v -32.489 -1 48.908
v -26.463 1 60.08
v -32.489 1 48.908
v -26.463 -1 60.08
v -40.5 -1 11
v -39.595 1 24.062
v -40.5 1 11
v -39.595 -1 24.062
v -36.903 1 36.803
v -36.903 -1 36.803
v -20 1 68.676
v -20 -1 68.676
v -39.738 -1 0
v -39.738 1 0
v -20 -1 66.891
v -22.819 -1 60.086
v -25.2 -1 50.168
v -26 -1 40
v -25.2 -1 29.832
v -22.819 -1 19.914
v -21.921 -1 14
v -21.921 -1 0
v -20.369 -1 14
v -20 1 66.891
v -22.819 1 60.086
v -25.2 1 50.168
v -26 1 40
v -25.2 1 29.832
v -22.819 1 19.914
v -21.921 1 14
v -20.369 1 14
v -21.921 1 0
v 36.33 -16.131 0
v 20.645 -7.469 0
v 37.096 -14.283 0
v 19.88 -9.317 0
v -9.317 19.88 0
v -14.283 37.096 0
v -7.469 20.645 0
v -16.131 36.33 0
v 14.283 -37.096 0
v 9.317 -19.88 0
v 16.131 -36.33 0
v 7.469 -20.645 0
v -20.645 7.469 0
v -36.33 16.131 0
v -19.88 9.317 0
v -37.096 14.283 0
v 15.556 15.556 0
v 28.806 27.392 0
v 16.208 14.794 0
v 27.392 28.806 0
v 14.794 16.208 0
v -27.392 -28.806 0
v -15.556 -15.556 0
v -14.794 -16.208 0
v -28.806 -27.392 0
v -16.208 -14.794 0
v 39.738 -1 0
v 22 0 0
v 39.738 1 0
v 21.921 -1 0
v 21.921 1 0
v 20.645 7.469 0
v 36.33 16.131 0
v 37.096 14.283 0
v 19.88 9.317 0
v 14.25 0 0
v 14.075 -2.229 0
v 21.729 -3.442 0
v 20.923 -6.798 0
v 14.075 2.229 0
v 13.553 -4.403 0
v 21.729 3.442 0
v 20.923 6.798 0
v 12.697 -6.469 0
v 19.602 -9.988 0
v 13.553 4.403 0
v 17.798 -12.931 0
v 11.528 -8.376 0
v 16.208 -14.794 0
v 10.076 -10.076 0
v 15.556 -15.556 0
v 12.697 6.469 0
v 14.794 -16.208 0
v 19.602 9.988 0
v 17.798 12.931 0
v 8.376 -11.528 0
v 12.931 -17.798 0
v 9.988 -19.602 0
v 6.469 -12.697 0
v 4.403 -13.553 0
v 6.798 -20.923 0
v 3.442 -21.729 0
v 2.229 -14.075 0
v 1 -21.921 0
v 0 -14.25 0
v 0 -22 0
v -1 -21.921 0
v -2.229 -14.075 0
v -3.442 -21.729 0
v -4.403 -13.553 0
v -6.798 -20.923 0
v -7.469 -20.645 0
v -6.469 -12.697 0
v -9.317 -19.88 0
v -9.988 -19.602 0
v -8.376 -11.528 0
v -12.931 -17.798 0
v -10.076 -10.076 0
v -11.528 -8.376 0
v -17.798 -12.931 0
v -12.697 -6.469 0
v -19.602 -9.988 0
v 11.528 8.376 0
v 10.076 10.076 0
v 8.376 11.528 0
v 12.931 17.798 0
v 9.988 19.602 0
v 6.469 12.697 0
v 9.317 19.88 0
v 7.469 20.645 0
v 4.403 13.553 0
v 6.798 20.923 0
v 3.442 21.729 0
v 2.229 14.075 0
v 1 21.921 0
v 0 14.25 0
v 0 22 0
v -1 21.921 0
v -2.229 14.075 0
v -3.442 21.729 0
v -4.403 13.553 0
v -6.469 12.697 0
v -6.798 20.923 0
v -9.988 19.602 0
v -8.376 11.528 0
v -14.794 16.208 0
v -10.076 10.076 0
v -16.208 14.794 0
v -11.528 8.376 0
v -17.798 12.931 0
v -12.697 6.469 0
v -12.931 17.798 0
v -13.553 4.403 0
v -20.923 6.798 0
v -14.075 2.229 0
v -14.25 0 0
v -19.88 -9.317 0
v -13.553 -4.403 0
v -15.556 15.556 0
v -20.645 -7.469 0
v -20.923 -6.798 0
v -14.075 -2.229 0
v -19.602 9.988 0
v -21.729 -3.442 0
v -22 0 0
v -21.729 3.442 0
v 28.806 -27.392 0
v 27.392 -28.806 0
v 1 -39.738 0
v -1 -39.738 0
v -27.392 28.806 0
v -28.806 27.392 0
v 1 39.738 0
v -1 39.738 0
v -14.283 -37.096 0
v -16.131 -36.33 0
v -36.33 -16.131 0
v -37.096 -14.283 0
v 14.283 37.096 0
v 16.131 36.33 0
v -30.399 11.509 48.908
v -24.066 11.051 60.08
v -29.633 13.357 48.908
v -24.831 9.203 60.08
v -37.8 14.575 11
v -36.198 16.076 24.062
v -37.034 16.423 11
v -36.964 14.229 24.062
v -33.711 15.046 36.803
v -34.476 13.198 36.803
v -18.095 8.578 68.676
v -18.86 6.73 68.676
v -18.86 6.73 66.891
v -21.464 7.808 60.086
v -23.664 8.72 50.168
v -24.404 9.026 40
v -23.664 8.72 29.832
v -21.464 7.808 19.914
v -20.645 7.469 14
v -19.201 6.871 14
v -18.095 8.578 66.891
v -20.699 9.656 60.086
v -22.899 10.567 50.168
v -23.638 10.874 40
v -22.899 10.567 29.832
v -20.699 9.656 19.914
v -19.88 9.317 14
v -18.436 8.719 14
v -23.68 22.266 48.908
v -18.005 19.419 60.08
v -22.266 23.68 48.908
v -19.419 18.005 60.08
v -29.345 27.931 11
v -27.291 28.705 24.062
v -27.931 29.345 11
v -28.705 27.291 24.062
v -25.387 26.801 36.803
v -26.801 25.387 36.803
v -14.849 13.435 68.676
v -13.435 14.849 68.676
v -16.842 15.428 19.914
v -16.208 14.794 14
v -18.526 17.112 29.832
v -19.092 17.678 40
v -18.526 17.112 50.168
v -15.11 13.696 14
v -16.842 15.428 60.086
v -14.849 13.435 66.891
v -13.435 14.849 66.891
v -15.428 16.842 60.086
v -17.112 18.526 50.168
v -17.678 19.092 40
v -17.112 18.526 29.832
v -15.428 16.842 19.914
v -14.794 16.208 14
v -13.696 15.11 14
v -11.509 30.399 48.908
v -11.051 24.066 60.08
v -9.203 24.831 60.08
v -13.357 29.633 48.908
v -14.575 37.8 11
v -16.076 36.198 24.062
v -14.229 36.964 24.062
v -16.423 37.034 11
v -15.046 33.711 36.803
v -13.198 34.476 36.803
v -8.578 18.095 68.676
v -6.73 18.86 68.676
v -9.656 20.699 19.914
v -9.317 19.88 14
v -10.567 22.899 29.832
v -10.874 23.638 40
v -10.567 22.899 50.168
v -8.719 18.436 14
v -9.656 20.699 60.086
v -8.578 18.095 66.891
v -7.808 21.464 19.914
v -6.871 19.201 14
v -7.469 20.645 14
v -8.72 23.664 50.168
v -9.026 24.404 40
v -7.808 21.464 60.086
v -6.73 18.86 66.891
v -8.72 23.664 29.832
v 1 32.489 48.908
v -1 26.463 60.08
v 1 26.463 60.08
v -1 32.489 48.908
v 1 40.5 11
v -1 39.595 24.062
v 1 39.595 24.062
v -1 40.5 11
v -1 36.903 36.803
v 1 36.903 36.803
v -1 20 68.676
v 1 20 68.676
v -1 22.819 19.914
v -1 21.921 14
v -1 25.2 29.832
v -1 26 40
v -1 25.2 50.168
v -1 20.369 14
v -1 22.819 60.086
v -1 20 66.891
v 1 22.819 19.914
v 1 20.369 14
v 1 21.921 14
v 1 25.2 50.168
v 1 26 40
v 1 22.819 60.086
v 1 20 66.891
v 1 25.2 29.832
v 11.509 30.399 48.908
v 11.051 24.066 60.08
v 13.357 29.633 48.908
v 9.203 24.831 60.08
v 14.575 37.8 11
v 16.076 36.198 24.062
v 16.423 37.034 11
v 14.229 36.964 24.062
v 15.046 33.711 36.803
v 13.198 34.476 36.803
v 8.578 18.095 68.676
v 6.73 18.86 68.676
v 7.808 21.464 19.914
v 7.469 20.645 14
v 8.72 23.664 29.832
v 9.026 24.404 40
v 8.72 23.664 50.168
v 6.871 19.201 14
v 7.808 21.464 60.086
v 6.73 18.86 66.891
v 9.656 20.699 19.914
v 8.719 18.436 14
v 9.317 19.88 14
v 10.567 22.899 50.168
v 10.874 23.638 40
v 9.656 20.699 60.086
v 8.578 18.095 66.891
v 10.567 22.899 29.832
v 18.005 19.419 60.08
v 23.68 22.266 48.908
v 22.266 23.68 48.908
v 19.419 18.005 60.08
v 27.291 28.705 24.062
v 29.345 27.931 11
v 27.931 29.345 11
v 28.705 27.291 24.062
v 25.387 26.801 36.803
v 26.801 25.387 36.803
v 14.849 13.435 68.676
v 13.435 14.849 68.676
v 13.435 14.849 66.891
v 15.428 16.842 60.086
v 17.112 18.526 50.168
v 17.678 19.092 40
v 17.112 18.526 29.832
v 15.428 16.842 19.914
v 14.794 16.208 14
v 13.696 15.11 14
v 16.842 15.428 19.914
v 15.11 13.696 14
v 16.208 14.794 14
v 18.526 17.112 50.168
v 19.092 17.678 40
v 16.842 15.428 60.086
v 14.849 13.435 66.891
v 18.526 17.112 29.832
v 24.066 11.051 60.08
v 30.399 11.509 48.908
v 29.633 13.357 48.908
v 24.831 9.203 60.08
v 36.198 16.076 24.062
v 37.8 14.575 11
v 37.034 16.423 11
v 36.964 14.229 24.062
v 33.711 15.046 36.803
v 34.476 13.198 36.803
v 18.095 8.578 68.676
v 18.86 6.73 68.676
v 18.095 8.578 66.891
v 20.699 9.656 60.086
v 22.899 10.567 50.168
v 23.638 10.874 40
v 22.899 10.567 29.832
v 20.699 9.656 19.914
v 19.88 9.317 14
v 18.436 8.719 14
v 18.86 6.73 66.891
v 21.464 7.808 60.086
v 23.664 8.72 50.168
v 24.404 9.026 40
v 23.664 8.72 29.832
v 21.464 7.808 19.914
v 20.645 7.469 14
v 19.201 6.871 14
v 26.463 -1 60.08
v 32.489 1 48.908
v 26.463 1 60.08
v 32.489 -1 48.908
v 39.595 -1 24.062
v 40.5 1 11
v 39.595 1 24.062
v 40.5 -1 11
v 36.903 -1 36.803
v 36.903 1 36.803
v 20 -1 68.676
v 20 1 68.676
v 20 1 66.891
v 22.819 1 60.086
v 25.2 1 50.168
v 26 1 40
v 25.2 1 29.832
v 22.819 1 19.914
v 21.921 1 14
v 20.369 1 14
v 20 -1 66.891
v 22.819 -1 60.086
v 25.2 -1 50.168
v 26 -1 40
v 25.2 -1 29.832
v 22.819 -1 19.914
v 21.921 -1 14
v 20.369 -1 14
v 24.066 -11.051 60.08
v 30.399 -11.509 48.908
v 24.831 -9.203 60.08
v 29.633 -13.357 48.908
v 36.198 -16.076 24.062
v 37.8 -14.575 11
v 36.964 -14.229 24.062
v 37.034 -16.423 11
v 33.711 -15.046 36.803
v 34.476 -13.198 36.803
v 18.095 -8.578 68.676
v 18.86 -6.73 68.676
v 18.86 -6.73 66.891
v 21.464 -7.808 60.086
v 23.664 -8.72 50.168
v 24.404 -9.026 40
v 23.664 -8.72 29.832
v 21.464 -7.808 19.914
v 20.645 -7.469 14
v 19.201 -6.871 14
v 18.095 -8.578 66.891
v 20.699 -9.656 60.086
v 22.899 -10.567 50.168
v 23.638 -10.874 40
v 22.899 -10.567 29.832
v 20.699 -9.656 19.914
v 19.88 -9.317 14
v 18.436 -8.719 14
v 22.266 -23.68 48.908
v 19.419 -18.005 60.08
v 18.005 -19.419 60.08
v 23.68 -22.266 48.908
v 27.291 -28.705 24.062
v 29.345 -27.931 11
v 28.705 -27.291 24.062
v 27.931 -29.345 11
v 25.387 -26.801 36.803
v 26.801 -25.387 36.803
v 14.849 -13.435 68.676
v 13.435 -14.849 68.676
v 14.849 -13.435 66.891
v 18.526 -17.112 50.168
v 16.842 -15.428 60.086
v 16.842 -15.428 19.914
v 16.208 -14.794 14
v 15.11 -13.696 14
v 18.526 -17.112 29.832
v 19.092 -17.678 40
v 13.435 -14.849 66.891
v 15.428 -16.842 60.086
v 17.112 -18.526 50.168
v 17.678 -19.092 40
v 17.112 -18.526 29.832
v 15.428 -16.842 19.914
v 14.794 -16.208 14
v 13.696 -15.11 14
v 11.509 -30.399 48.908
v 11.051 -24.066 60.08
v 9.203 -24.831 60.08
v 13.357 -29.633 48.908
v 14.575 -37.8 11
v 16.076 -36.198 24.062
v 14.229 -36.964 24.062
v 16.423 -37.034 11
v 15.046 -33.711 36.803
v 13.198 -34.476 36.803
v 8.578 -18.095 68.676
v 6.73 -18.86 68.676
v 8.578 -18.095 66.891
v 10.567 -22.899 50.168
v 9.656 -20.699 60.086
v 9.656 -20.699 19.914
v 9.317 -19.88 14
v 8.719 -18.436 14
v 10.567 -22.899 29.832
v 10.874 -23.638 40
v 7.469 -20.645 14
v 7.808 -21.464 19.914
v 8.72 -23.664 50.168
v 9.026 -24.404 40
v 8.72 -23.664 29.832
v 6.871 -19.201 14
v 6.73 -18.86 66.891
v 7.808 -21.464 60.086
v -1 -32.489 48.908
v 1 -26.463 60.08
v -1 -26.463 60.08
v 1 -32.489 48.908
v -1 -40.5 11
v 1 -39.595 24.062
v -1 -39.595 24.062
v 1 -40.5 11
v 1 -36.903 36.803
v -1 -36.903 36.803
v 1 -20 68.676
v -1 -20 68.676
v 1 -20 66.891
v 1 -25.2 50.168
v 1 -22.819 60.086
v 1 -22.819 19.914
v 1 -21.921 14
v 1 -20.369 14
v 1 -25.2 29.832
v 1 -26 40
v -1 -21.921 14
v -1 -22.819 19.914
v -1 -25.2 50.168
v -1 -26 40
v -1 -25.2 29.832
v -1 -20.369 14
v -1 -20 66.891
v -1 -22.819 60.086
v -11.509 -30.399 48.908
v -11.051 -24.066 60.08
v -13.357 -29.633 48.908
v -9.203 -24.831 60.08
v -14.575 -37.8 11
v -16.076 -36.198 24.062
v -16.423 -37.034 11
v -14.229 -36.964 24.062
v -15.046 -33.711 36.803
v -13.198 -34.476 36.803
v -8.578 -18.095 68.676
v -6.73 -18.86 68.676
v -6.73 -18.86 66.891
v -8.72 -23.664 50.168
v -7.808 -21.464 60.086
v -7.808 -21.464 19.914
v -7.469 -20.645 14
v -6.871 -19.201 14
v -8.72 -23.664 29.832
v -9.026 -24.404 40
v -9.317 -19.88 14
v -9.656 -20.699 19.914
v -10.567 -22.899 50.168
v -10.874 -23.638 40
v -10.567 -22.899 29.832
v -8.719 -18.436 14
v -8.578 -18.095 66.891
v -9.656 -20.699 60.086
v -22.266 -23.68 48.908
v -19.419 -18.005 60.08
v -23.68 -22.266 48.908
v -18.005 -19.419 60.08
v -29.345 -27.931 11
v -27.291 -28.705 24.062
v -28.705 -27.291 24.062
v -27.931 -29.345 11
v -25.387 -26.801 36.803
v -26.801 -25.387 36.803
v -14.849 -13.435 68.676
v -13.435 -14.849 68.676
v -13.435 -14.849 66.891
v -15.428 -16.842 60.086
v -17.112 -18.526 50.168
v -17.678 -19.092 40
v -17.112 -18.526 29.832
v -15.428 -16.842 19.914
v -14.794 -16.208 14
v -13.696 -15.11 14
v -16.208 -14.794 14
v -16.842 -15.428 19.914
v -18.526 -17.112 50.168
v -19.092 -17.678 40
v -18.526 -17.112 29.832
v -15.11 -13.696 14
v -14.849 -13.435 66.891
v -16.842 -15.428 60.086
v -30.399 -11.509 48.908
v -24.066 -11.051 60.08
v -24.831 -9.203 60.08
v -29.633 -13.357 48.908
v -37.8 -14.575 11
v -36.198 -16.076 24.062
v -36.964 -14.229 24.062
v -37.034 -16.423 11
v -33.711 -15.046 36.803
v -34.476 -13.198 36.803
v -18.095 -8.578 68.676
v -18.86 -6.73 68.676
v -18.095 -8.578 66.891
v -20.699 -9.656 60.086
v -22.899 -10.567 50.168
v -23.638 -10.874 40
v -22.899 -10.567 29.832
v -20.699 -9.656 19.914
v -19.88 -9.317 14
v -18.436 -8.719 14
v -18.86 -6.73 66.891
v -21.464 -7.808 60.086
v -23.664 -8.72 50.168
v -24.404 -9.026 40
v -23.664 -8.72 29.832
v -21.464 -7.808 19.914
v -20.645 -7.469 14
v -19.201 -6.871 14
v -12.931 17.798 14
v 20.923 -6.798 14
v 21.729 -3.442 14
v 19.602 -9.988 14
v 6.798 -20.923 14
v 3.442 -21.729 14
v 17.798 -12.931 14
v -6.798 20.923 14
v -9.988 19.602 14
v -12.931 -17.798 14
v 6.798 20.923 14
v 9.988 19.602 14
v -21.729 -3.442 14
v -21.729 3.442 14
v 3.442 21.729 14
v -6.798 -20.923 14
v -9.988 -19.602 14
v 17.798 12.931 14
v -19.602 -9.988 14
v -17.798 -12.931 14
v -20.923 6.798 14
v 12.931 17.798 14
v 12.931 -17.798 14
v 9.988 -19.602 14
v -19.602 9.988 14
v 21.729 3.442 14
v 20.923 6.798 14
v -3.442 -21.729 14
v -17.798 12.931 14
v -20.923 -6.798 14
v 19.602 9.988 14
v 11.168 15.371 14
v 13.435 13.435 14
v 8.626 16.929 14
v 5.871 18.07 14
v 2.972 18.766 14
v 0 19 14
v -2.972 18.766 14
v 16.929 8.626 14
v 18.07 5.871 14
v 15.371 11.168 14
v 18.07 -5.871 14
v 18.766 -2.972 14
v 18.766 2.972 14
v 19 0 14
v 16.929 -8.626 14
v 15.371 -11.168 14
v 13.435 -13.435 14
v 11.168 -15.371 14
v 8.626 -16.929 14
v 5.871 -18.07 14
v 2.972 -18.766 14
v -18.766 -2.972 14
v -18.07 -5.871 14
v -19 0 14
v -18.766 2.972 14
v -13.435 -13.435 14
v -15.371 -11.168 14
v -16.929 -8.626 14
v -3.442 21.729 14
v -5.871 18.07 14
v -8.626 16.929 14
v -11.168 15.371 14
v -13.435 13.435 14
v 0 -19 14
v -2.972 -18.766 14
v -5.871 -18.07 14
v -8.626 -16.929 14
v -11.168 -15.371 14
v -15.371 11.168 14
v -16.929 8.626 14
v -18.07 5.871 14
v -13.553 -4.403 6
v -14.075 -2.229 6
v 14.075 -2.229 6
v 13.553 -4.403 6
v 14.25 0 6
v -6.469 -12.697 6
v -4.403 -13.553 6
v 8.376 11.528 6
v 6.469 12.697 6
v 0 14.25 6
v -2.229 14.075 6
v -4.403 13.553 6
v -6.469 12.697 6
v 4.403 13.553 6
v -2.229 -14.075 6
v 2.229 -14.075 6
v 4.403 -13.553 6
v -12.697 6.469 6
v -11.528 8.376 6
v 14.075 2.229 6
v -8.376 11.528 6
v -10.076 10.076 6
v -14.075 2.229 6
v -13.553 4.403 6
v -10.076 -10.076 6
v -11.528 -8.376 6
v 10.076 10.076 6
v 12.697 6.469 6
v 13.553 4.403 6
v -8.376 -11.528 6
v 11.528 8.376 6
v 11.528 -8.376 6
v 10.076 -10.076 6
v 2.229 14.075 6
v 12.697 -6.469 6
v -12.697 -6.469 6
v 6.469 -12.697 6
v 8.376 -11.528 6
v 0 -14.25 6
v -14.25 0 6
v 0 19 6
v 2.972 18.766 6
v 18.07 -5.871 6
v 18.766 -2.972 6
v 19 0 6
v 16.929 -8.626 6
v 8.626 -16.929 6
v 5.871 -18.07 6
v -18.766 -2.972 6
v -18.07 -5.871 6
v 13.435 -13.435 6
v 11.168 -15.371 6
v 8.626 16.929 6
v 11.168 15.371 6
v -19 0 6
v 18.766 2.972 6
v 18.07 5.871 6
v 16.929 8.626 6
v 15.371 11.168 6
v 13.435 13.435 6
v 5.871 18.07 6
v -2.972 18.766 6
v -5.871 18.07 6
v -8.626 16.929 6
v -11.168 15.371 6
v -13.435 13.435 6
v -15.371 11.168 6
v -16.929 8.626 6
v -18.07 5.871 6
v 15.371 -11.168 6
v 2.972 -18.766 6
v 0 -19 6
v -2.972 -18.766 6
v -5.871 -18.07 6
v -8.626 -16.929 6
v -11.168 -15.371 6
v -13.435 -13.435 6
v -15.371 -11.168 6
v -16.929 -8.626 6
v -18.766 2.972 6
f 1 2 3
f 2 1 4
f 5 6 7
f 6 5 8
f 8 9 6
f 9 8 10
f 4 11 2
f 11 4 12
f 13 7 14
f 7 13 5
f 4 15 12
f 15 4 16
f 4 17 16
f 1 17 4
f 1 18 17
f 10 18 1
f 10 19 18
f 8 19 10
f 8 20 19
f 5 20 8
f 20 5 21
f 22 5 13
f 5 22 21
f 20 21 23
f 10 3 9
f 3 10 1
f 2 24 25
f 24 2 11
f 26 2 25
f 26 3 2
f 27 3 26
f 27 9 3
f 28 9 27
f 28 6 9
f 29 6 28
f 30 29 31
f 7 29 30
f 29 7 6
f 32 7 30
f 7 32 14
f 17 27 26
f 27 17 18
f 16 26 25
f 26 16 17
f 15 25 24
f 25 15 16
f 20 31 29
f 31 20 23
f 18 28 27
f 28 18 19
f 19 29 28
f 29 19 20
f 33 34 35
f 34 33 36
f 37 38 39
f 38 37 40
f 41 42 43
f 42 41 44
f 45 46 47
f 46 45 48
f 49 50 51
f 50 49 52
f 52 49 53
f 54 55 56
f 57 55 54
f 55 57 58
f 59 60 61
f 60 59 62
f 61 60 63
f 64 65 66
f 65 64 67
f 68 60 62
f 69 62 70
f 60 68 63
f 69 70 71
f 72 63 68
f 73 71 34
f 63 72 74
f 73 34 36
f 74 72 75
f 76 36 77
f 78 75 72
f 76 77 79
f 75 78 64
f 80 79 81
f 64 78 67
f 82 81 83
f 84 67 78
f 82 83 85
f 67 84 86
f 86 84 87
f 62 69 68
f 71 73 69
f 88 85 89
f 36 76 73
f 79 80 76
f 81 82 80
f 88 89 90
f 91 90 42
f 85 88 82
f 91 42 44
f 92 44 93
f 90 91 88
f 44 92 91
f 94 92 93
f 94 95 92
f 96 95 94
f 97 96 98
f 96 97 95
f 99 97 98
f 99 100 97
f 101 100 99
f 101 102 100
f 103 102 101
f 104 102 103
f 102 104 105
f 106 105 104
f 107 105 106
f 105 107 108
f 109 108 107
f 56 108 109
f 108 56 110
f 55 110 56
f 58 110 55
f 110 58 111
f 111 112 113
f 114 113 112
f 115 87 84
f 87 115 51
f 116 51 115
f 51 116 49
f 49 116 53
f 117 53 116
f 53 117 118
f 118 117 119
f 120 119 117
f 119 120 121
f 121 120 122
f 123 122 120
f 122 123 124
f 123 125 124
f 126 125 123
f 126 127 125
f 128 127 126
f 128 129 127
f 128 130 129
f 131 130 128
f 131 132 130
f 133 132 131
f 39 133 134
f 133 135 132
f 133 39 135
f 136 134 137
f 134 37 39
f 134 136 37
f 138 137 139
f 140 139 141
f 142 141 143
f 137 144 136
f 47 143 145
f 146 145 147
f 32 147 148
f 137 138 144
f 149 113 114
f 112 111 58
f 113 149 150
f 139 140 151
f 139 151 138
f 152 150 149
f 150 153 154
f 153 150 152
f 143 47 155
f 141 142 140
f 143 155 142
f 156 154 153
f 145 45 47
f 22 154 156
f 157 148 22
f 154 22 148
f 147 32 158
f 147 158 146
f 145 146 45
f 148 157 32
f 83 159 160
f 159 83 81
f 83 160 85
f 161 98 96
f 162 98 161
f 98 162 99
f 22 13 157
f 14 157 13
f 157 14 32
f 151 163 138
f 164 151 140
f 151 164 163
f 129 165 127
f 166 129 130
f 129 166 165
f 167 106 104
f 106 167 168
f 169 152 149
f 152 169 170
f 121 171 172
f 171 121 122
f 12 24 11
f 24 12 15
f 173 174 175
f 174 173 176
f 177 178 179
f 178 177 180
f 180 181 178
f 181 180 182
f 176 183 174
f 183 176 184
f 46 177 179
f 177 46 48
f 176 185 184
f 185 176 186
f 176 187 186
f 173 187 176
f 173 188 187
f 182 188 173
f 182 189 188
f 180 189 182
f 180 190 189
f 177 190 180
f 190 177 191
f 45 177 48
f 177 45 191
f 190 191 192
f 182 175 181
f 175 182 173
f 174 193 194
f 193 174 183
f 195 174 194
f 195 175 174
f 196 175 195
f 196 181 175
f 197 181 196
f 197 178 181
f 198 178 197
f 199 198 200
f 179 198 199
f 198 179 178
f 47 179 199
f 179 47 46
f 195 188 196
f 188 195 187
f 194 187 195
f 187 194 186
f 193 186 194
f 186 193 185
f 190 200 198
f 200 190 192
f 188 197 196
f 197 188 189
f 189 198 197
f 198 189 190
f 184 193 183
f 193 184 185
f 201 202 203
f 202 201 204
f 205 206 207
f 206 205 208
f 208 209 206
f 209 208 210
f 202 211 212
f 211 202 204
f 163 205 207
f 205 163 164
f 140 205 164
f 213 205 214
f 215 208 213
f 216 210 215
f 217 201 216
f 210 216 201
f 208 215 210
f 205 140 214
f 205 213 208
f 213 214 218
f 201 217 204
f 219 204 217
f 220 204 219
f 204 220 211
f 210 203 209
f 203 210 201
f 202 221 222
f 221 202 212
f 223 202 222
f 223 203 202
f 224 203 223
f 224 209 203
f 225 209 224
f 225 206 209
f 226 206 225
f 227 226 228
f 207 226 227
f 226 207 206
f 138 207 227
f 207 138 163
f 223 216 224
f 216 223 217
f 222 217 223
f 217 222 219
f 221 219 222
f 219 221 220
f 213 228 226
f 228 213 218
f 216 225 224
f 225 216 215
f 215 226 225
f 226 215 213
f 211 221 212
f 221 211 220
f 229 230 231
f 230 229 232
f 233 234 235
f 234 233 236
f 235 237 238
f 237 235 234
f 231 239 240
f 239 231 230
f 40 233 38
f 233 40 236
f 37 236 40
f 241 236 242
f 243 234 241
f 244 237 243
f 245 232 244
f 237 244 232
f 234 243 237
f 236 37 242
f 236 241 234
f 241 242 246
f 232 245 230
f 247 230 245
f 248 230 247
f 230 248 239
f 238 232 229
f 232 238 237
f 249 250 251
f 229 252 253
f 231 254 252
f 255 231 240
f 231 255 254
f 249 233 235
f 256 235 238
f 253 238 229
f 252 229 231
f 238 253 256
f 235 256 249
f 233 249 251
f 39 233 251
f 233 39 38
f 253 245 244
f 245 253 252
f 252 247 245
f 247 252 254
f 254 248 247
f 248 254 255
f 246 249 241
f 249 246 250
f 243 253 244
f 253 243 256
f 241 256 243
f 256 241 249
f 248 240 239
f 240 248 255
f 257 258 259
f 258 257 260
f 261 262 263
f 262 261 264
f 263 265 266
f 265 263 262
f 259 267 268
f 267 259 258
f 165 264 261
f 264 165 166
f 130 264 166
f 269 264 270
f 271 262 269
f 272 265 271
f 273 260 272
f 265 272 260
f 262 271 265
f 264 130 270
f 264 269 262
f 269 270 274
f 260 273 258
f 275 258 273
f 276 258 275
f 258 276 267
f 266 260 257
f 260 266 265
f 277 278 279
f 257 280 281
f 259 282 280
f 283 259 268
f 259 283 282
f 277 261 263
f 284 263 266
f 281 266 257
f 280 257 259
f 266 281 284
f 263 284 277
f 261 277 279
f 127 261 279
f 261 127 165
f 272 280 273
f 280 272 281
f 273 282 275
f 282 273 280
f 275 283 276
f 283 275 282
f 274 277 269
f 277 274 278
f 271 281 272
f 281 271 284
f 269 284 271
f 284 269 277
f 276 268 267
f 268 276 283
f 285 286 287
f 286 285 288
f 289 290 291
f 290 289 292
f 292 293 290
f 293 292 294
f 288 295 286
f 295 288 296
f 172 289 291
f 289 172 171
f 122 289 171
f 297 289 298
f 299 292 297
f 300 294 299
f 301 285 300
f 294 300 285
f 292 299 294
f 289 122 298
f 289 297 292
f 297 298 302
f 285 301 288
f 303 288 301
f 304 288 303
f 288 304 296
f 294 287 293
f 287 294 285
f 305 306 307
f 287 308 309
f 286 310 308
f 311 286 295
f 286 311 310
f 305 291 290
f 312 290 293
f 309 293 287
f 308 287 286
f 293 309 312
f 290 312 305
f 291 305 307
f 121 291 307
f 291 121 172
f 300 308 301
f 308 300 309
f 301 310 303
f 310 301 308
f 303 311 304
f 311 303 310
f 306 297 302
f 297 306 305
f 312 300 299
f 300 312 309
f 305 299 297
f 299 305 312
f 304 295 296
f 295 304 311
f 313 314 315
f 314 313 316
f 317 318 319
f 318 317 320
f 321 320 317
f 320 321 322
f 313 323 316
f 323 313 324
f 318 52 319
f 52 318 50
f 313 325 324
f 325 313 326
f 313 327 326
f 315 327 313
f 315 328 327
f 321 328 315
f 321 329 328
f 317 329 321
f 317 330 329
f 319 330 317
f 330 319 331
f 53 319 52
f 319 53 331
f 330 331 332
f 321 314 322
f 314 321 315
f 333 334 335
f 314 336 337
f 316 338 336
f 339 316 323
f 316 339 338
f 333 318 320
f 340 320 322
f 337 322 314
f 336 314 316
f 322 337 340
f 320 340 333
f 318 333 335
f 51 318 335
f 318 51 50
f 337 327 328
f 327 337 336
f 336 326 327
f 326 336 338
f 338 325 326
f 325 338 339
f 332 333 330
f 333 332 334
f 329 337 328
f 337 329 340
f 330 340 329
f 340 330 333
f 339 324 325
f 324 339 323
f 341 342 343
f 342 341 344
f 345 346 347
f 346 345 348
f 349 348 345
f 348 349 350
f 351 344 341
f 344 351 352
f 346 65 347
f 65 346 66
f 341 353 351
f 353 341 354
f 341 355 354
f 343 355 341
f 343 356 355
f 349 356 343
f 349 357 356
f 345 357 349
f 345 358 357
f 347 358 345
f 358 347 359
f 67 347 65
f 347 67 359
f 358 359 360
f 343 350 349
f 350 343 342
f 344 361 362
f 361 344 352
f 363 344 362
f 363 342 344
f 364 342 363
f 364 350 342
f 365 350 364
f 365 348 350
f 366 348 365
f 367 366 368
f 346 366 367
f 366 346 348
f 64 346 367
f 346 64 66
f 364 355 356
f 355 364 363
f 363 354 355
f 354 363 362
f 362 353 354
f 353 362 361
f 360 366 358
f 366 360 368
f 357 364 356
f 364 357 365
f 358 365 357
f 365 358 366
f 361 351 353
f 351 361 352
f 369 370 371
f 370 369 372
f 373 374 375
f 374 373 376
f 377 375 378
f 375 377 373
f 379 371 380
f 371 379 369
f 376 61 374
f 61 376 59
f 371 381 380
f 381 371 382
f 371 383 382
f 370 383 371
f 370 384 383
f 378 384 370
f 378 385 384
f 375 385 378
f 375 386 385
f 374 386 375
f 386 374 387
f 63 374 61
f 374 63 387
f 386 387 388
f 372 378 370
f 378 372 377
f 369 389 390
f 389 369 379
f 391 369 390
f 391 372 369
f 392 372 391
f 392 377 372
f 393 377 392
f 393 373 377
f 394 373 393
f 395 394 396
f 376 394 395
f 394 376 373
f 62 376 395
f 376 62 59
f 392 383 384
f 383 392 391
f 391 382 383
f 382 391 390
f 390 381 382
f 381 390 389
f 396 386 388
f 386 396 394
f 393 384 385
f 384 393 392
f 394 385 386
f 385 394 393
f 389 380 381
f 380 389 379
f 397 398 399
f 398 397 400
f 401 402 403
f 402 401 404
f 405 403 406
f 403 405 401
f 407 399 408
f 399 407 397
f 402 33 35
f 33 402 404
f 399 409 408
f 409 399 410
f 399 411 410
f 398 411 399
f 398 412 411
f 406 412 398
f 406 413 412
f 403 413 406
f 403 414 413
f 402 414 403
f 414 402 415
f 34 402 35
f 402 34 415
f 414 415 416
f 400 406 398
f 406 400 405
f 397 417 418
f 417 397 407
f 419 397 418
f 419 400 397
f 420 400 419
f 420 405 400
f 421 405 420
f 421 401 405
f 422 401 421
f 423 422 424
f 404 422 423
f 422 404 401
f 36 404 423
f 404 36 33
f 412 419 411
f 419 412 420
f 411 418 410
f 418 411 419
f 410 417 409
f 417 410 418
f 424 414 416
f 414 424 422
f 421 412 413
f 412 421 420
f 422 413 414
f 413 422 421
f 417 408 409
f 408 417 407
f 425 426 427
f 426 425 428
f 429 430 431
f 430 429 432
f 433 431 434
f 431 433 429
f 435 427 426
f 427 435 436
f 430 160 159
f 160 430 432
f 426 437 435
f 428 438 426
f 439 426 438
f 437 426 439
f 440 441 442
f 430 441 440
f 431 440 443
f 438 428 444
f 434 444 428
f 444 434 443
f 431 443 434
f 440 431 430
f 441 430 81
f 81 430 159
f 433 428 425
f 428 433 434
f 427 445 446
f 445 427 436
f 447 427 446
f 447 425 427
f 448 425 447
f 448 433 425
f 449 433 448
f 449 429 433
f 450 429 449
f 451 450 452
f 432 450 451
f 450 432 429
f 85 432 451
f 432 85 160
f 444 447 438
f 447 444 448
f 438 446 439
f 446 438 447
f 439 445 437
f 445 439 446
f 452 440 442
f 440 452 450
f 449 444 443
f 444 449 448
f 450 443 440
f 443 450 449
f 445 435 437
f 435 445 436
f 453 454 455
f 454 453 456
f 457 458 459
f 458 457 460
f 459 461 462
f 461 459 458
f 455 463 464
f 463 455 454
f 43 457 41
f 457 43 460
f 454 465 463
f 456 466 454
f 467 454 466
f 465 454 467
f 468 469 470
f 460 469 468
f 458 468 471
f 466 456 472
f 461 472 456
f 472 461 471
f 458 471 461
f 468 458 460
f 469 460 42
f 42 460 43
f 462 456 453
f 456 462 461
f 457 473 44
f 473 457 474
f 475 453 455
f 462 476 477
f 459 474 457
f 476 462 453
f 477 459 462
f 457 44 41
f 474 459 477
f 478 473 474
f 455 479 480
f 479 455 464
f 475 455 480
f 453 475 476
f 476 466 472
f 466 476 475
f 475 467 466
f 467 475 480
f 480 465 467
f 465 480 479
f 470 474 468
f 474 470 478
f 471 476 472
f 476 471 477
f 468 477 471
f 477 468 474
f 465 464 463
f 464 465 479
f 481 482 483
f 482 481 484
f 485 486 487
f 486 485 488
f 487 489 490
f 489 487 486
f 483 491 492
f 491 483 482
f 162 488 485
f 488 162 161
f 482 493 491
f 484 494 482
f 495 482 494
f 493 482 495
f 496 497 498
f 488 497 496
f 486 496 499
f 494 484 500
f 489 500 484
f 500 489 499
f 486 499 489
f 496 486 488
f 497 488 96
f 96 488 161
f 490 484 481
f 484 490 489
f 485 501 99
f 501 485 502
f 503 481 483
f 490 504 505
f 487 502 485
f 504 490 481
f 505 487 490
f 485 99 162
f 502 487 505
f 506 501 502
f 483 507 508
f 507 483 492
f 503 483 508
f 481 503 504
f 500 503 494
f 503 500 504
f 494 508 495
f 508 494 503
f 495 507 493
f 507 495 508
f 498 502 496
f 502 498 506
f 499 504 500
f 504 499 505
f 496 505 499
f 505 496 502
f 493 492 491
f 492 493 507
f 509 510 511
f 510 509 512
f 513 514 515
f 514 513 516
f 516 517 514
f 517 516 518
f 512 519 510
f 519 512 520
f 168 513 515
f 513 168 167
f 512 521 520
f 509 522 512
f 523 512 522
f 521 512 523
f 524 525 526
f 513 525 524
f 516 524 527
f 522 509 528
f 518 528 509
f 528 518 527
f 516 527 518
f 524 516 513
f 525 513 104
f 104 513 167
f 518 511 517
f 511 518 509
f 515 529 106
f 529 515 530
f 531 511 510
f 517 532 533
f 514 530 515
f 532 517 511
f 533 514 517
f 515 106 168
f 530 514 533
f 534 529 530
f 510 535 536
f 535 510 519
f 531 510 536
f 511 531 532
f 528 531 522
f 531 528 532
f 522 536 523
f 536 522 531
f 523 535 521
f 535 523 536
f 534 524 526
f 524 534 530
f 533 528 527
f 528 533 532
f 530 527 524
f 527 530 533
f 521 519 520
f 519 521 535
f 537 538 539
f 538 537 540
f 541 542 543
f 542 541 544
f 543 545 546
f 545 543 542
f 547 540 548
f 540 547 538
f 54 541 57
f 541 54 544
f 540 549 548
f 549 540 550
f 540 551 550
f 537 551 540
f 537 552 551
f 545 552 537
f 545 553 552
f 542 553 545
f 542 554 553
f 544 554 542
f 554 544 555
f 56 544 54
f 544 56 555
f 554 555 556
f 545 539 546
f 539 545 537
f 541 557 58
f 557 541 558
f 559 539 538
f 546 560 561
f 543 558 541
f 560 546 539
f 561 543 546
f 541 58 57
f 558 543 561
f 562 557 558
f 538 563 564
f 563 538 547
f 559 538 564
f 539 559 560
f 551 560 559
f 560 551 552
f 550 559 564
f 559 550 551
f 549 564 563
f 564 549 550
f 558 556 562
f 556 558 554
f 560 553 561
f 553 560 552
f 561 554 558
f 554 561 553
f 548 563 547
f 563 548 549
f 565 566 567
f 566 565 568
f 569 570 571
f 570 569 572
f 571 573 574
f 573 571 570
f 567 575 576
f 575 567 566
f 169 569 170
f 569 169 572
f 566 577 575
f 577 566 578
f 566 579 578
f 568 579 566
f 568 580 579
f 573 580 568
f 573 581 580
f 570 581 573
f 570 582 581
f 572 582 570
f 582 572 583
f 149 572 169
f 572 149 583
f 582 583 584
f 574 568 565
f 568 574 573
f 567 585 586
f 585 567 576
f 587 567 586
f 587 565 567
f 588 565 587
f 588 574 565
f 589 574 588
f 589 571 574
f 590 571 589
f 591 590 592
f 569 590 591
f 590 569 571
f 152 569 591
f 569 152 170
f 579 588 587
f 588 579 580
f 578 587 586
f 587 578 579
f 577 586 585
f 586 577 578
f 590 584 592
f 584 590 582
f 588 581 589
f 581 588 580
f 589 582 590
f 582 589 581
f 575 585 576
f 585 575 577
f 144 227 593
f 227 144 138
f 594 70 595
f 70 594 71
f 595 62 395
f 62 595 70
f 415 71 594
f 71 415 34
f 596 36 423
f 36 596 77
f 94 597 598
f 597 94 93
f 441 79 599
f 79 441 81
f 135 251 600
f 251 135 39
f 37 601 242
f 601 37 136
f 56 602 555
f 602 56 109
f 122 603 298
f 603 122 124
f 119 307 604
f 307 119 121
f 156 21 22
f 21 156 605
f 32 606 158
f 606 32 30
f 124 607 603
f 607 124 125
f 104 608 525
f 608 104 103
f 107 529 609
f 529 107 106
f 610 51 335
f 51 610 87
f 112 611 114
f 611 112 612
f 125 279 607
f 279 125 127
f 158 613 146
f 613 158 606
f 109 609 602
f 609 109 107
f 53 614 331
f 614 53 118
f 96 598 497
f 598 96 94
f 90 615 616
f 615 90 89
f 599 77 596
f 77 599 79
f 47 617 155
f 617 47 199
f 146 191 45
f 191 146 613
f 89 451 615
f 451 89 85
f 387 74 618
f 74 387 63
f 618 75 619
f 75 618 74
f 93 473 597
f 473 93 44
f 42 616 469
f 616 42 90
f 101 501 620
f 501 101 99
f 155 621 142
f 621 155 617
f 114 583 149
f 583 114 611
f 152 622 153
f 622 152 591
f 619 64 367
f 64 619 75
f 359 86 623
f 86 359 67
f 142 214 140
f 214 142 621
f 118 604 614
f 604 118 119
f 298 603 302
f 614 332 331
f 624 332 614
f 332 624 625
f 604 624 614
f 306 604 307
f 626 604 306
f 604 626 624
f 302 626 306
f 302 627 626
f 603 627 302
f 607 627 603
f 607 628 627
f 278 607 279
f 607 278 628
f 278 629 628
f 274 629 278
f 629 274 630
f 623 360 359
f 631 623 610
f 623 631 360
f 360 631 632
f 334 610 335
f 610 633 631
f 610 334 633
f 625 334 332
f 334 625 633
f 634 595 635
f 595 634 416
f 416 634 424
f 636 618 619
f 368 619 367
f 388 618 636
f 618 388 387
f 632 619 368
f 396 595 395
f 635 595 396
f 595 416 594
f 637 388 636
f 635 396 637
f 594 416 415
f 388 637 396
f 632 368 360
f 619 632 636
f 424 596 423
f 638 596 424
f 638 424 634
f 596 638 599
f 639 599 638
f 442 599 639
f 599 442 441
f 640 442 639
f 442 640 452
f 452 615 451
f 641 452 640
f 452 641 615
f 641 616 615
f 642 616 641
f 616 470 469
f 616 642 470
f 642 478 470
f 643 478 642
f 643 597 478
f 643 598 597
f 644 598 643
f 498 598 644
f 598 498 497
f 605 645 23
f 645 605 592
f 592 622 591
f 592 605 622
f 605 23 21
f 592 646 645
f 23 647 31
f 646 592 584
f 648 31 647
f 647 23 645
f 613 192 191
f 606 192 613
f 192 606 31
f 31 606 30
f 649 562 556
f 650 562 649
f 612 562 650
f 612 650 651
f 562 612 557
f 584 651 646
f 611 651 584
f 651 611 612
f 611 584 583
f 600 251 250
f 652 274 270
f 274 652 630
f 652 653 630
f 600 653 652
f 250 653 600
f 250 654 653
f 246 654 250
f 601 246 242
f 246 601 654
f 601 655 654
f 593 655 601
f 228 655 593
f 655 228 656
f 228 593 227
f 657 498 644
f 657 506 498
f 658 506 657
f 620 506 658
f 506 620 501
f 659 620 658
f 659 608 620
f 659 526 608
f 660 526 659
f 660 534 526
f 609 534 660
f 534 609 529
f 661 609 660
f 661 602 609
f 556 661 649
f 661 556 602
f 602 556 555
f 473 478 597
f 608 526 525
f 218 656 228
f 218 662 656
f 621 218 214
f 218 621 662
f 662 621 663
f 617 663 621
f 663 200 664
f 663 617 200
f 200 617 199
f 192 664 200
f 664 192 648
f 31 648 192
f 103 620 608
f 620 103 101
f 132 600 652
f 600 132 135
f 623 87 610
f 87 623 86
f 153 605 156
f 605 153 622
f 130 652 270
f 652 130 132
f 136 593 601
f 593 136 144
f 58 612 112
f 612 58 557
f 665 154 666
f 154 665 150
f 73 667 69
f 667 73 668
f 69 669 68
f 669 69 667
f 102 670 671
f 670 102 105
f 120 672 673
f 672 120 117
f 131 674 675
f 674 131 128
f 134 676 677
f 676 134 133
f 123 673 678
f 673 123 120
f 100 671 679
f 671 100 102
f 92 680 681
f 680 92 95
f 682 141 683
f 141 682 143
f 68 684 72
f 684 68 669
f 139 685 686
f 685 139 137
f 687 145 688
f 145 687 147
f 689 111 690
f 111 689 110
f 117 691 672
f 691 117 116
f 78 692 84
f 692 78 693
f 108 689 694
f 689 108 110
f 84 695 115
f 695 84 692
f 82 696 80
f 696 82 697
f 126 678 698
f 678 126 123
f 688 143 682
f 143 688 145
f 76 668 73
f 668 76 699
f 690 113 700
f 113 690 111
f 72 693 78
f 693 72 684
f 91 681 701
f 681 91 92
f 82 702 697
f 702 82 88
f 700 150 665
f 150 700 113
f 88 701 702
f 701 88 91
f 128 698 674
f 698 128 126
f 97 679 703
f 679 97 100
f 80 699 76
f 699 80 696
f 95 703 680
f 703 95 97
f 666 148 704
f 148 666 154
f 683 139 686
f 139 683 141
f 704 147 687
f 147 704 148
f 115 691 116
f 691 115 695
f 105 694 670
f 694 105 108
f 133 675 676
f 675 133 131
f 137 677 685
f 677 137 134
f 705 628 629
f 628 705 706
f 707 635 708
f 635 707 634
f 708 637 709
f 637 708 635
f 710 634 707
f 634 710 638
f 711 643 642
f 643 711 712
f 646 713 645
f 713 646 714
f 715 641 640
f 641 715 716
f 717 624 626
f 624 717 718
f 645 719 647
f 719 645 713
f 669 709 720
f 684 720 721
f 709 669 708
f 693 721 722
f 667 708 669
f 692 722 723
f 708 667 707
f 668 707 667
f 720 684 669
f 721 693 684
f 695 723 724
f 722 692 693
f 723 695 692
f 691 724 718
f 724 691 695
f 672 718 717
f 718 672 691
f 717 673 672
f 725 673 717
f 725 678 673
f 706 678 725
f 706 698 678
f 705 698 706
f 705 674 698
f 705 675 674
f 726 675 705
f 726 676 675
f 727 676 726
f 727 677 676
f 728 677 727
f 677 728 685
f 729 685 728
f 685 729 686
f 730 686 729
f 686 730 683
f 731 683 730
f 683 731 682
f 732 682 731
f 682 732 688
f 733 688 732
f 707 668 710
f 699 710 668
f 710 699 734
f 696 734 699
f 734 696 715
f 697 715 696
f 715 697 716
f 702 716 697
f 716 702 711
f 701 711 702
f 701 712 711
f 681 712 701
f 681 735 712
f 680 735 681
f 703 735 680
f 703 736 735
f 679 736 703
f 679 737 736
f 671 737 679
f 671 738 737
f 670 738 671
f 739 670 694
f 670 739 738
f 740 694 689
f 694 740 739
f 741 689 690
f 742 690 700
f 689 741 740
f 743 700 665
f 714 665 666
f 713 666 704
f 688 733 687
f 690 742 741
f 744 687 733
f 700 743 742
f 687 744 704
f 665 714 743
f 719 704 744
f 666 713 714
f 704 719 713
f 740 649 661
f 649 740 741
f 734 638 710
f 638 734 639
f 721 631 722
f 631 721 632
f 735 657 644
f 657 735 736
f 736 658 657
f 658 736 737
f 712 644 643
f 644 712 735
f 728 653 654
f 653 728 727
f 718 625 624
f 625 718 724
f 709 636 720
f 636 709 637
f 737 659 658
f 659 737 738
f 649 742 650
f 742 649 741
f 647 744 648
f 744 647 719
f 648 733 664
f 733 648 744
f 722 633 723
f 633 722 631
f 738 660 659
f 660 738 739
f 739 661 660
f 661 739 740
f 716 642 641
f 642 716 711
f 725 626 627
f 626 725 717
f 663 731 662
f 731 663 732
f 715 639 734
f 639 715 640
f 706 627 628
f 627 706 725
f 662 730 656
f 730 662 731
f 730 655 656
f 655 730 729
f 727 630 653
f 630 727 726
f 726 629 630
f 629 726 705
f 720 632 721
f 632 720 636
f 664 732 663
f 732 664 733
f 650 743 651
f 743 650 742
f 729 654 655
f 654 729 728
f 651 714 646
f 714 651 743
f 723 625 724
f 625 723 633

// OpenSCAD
/// Ikea light mod v3 - March 25,2016


/////////  base plate variables
basePlate_d=44;
basePlate_h=14;
baseTubeSub_d=38;
baseTubeSub_h=10;
basePlateSub_d=28.5;    // hole for ikea type G lamp stand
basePlateSub_h=10;
//////////  fins variables
finShape_d=147;
finShape_h=2;
finShapeSub_d=130;
finShapeSub_h=finShape_h+2;

/////////  final assembly
rotate([180,0,0])
    bottomAssy();
module bottomAssy() {
    
    rotate([0,0,0])
        finAssy();
    rotate([0,0,22.5])
        finAssy();    
    rotate([0,0,45])
        finAssy();
    rotate([0,0,67.5])
        finAssy();
    rotate([0,0,90])
        finAssy();
    rotate([0,0,112.5])
        finAssy();    
    rotate([0,0,135])
        finAssy();
    rotate([0,0,157.5])
        finAssy();
    rotate([0,0,180])
        finAssy();
    rotate([0,0,202.5])
        finAssy();   
    rotate([0,0,225])
        finAssy();
    rotate([0,0,247.5])
        finAssy();
    rotate([0,0,270])
        finAssy();
    rotate([0,0,292.5])
        finAssy();
    rotate([0,0,315])
        finAssy();
    rotate([0,0,337.5])
        finAssy();
    translate([0,0,-5])    
    basePlateAssy();
}
module basePlateAssy() {
    difference() {
        translate([0,0,-2])
            basePlate();
        translate([0,0,2])
            basePlateSub();
        translate([0,0,-6])    
            baseTubeSub();
    }
}

module finAssy() {
        translate([-20,0,0])
    rotate([90,0,])             // rotate 90 degrees for assembly
//        translate([-20,-60,-10])
//            cubeShadow();      // width comparison
    difference() {
        translate([53,-11,0])
        finShape(); 
        translate([59,-40,0])   //  was 56,-40,0
            finShapeSub();
        translate([-22,0,-2])
            cubeSub();          // cut top
        translate([0,-100,-2])
            cubeSub();          // cut right
    }
}

////////// basic shapes
module basePlate() {
    color("blue")
    cylinder(d=basePlate_d, h=basePlate_h, center=true, $fn=40);

}
module finShape() {
    color("green")
        resize([finShape_d, finShape_d+20, finShape_h])
    cylinder(d=finShape_d, h=finShape_h, center=true, $fn=40);
    }
////////// Subtractions

module basePlateSub() {
    color("red")
        cylinder(d=basePlateSub_d, h=basePlateSub_h, center=true, $fn=40); 
}
module baseTubeSub() {
    color("orange")
       cylinder(d=baseTubeSub_d, h=baseTubeSub_h, center=true, $fn=40);
}
module finShapeSub() {
    color("yellow")
    cylinder(d=finShapeSub_d, h=finShapeSub_h, center=true, $fn=40);
}

module cubeSub() {
    color("tomato")
    cube([200,200,5]);
}
////////// shadow shapes
    module cubeShadow() {
    color("greenyellow")
    cube([20,60,1]);
}
